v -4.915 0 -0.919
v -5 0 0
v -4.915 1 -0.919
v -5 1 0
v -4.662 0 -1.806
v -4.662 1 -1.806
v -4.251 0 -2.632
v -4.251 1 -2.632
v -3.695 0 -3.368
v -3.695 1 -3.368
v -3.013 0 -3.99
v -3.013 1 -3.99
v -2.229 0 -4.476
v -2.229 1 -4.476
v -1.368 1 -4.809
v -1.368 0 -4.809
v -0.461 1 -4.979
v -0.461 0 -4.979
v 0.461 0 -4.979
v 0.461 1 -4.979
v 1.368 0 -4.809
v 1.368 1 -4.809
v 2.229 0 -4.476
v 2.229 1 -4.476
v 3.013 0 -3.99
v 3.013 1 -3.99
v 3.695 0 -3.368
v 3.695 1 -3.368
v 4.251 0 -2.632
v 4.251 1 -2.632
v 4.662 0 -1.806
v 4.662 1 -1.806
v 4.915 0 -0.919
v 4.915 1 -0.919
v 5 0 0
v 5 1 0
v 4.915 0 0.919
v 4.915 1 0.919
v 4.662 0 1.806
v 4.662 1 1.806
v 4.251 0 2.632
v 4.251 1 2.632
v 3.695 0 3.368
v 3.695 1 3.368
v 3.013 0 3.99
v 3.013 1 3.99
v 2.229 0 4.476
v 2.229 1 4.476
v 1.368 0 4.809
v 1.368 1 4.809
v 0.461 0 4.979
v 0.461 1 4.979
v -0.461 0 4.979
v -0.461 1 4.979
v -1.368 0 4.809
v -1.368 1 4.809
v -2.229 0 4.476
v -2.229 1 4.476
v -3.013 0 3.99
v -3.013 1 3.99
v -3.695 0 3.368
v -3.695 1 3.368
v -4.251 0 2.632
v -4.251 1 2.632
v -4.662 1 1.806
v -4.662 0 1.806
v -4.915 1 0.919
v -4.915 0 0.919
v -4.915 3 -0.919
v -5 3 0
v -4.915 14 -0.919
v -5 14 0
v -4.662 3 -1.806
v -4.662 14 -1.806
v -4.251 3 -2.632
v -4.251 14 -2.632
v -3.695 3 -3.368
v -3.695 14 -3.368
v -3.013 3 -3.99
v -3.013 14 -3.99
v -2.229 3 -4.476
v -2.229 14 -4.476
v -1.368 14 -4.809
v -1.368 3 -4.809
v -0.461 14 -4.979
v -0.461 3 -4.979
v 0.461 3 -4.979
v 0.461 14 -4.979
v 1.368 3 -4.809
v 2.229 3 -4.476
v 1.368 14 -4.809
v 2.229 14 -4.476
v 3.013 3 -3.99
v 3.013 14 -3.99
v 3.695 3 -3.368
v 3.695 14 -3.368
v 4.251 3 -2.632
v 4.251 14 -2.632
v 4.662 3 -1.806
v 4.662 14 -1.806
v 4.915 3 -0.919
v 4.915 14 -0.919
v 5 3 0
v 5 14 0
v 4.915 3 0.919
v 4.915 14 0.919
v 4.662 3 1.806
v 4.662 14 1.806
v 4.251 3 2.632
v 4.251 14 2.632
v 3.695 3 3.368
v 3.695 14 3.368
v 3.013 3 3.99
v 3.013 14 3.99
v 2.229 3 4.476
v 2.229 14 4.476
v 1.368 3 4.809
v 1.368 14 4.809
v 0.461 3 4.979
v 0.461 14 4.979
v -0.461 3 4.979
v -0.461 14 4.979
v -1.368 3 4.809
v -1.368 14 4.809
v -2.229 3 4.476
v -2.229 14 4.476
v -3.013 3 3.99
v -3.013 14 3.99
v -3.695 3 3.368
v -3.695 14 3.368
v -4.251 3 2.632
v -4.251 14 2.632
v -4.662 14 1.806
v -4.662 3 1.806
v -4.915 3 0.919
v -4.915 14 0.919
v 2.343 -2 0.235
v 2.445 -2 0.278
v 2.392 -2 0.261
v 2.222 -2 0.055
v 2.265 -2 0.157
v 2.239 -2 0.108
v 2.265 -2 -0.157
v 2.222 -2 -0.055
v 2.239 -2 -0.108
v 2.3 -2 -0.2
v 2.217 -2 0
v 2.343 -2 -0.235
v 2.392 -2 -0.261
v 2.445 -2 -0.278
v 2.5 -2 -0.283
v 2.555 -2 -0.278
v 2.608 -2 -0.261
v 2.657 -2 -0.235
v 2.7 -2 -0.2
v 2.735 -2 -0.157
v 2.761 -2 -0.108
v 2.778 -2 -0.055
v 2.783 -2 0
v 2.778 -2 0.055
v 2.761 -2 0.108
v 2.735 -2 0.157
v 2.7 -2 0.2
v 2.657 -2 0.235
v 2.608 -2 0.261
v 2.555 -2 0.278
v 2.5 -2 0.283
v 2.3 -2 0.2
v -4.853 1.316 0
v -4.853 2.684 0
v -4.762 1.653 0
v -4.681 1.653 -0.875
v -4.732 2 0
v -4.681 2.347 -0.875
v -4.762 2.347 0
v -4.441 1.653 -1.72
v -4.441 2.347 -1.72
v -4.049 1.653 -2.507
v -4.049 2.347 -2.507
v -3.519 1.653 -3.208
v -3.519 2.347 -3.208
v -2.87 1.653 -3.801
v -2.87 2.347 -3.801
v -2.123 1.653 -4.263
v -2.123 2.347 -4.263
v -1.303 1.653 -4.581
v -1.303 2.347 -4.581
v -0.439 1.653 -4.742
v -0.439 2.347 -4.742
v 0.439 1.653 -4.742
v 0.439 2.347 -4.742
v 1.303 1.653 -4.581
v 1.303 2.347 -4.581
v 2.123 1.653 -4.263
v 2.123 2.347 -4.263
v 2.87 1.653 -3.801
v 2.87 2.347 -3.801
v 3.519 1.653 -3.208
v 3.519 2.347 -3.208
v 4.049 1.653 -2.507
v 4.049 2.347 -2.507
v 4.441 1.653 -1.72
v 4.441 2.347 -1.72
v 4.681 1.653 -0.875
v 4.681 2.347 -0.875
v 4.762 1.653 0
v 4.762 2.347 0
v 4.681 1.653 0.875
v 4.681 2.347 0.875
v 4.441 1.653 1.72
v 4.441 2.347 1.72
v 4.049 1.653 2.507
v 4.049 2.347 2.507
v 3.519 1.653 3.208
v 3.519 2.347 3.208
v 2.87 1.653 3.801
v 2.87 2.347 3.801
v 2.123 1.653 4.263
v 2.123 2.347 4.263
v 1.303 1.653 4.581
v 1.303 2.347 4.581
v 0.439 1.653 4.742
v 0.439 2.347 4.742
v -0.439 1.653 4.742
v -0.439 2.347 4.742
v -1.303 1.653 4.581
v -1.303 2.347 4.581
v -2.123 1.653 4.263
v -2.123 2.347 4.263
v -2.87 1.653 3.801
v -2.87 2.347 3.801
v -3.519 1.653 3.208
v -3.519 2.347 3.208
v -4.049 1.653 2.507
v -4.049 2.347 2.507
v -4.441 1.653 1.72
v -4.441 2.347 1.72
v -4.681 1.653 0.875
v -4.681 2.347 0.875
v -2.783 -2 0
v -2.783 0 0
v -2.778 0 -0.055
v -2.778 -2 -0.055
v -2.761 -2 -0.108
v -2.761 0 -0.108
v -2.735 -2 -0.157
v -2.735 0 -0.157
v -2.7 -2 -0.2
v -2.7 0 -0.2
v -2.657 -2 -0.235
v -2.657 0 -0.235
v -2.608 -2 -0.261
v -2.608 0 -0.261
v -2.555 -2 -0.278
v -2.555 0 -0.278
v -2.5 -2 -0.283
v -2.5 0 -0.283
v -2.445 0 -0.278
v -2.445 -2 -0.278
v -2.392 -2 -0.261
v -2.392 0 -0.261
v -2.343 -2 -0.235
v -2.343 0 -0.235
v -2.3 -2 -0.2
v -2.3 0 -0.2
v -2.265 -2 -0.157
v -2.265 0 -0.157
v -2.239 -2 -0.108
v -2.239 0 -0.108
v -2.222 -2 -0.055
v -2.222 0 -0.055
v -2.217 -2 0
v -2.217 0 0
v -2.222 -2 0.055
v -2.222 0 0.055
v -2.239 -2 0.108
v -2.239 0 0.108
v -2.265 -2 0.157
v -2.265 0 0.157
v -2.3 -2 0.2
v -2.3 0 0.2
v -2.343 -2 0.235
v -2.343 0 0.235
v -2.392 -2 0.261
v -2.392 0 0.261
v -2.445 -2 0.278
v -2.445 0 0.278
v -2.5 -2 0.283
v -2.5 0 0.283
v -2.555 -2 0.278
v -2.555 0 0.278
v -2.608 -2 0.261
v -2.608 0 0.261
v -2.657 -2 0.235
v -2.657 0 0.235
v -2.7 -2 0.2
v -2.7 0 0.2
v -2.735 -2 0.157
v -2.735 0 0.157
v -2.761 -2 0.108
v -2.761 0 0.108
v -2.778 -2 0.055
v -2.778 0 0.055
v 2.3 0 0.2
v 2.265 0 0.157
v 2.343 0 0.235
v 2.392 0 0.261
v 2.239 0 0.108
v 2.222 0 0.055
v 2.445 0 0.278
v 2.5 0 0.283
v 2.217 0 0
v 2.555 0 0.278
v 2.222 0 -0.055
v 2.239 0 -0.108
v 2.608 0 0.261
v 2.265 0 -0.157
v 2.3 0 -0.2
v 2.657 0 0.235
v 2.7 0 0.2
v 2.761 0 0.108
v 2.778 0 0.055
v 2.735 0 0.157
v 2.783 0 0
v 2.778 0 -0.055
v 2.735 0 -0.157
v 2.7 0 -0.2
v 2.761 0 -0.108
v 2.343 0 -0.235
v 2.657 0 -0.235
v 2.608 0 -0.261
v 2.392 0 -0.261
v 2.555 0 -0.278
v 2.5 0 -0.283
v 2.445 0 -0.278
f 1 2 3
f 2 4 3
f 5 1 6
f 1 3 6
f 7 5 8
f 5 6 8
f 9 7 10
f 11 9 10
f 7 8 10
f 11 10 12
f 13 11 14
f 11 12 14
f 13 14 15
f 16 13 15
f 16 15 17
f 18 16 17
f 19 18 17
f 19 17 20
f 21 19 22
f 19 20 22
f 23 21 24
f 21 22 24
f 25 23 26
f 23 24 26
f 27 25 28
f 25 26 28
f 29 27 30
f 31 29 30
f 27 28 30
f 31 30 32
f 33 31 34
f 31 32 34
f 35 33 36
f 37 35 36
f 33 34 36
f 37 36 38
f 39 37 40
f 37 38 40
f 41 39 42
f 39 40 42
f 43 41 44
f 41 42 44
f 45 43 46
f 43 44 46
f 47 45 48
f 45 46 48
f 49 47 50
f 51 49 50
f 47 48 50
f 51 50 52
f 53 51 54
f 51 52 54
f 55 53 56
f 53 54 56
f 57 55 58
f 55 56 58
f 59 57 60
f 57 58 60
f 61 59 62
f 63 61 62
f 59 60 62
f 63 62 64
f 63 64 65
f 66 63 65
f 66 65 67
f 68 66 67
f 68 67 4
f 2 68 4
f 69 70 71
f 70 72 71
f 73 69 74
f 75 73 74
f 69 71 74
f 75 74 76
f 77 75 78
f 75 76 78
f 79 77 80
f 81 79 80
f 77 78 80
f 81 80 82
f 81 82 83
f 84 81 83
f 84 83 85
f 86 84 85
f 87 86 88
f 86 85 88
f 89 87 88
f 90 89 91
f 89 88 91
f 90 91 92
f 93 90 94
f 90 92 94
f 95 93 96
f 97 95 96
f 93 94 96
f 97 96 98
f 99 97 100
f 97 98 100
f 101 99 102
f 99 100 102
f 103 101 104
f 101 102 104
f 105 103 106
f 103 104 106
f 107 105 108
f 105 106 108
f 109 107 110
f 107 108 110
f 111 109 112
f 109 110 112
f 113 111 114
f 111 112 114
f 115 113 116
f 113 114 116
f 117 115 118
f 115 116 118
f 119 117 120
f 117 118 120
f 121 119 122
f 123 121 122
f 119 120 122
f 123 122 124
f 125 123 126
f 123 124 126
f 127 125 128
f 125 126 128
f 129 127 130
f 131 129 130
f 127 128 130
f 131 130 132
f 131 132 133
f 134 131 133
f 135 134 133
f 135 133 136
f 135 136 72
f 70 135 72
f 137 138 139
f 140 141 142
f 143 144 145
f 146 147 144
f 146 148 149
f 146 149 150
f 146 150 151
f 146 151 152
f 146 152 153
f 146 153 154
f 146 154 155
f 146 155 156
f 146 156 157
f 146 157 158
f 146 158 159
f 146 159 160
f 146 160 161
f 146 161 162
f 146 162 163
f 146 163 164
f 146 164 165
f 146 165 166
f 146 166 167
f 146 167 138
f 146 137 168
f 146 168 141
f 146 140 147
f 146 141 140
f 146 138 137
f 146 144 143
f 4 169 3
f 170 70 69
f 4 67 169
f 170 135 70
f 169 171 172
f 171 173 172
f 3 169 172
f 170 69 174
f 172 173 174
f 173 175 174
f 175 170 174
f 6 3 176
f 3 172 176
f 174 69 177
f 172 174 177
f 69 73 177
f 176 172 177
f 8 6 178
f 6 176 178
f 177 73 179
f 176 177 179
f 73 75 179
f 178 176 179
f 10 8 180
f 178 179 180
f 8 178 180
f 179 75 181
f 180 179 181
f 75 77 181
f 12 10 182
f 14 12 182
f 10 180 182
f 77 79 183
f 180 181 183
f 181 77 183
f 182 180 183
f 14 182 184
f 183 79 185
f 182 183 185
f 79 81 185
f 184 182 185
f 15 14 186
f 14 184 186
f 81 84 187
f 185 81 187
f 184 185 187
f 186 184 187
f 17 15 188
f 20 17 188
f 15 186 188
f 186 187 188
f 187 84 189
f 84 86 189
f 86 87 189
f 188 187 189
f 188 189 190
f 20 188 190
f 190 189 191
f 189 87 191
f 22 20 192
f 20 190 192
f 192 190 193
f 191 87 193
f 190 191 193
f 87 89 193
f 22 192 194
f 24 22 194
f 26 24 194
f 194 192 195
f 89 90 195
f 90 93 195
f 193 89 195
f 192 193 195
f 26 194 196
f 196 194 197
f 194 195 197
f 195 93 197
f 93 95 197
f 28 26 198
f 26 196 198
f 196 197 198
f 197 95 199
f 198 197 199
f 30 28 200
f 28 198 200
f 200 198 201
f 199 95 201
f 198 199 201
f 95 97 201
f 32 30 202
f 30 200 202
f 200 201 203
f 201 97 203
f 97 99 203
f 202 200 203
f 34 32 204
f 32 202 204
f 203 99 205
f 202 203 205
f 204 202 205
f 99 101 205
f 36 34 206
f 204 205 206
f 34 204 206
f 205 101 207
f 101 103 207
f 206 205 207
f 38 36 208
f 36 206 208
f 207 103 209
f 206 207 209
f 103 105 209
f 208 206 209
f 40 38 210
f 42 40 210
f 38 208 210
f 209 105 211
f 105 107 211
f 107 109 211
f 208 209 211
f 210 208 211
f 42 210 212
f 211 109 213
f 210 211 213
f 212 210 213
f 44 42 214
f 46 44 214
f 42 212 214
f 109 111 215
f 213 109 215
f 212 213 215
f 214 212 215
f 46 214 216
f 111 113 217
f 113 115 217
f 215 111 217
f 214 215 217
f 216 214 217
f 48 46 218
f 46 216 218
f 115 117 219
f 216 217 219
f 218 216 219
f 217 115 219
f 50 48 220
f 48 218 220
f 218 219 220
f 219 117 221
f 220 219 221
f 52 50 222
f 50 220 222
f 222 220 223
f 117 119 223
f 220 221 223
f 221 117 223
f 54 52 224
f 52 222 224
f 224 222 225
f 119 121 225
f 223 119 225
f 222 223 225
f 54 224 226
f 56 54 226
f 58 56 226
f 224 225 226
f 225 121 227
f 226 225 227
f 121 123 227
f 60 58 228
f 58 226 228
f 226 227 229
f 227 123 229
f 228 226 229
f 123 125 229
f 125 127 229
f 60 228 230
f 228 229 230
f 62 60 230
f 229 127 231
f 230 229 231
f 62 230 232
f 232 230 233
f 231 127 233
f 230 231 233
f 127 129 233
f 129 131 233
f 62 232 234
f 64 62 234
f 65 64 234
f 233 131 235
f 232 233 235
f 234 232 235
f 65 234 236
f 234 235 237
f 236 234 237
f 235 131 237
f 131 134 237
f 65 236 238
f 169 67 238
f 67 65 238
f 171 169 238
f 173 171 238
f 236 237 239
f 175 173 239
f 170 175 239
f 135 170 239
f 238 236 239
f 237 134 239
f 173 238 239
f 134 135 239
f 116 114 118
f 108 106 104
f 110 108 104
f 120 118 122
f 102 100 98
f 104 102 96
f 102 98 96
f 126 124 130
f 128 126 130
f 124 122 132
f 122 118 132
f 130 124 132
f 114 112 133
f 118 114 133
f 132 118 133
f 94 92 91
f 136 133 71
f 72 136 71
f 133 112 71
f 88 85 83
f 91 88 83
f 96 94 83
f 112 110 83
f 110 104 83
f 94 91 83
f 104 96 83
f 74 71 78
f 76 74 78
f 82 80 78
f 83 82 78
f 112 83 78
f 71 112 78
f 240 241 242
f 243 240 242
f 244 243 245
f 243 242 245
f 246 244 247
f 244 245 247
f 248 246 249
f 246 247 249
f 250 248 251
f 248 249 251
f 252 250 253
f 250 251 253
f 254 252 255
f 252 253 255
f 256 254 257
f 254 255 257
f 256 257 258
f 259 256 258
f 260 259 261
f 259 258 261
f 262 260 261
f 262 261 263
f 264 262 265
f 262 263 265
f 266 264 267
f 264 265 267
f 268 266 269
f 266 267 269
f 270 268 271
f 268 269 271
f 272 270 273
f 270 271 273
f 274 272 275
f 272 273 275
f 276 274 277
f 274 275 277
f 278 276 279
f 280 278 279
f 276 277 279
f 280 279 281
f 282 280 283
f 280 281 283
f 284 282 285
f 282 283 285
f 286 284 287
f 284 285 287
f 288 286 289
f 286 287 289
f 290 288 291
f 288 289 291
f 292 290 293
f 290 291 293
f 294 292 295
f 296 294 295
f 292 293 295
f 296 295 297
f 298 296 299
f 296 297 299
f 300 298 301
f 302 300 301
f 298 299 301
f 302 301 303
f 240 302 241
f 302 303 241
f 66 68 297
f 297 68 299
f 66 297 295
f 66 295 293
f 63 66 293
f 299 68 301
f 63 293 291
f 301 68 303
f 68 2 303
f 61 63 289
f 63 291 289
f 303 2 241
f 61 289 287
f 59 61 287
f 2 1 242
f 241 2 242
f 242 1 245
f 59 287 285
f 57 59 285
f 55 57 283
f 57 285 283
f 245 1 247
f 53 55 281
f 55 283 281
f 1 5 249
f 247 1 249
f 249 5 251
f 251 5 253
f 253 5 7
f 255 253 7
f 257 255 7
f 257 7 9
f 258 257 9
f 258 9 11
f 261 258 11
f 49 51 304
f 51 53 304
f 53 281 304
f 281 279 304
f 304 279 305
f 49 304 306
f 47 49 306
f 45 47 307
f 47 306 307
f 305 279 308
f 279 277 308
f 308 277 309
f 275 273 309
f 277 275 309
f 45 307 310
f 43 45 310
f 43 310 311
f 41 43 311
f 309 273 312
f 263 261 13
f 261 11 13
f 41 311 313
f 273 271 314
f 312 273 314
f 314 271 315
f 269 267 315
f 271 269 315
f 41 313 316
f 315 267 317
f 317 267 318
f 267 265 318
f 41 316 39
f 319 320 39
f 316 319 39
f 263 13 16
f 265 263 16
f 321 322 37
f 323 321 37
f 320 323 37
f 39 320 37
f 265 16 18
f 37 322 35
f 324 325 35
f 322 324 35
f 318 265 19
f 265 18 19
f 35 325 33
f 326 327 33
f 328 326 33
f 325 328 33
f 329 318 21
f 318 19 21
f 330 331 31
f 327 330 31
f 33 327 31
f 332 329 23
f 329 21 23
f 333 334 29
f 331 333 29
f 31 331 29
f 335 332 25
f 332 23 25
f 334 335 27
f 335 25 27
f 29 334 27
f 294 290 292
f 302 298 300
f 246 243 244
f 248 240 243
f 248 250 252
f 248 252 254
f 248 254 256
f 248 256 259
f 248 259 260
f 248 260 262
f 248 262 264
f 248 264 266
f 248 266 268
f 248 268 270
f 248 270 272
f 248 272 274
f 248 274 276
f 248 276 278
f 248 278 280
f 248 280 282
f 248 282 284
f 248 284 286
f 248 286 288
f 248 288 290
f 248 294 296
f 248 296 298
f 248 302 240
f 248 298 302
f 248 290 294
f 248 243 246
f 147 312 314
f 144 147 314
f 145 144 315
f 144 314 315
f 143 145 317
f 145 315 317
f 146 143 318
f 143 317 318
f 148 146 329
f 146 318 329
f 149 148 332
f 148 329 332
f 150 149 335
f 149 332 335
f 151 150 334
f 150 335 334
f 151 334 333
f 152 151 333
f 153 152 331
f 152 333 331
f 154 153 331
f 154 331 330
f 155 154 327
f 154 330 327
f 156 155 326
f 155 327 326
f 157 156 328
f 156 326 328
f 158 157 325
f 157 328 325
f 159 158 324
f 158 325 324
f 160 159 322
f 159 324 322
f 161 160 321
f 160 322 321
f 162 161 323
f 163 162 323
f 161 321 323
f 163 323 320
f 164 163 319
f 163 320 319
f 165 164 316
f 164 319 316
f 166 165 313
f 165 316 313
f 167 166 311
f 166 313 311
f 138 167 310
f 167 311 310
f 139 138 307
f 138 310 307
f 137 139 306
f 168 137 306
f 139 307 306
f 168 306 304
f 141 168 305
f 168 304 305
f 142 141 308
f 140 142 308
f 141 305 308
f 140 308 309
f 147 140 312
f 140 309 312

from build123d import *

# Parameters (mm, degrees)
SKETCH2_R           = 0.282946128
BOSS_EXTRUDE1_DEPTH = 2


with BuildPart() as part:
    # Sketch1 → Revolve1 (revolve)
    with BuildSketch(Plane.XY, mode=Mode.PRIVATE) as revolve1_sk:
        with BuildLine():
            Line((0, 14), (0, 0))
            Line((0, 0), (5, 0))
            Line((5, 0), (5, 1))
            ThreePointArc((5, 1), (4.732050808, 2), (5, 3))
            Line((5, 3), (5, 14))
            Line((5, 14), (0, 14))
        make_face()
    revolve(revolve1_sk.sketch.rotate(Axis((0, 14, 0), (0, -1, 0)), 180), axis=Axis((0, 14, 0), (0, -1, 0)))

    # Sketch2 → Boss-Extrude1 (add)
    with BuildSketch(Plane.XZ):
        with Locations(Location((2.5, 0, 0), (0, 0, 180))):
            Circle(SKETCH2_R)
        with Locations(Location((-2.5, 0, 0), (0, 0, 180))):
            Circle(SKETCH2_R)
    extrude(amount=BOSS_EXTRUDE1_DEPTH)


solid = part.part
